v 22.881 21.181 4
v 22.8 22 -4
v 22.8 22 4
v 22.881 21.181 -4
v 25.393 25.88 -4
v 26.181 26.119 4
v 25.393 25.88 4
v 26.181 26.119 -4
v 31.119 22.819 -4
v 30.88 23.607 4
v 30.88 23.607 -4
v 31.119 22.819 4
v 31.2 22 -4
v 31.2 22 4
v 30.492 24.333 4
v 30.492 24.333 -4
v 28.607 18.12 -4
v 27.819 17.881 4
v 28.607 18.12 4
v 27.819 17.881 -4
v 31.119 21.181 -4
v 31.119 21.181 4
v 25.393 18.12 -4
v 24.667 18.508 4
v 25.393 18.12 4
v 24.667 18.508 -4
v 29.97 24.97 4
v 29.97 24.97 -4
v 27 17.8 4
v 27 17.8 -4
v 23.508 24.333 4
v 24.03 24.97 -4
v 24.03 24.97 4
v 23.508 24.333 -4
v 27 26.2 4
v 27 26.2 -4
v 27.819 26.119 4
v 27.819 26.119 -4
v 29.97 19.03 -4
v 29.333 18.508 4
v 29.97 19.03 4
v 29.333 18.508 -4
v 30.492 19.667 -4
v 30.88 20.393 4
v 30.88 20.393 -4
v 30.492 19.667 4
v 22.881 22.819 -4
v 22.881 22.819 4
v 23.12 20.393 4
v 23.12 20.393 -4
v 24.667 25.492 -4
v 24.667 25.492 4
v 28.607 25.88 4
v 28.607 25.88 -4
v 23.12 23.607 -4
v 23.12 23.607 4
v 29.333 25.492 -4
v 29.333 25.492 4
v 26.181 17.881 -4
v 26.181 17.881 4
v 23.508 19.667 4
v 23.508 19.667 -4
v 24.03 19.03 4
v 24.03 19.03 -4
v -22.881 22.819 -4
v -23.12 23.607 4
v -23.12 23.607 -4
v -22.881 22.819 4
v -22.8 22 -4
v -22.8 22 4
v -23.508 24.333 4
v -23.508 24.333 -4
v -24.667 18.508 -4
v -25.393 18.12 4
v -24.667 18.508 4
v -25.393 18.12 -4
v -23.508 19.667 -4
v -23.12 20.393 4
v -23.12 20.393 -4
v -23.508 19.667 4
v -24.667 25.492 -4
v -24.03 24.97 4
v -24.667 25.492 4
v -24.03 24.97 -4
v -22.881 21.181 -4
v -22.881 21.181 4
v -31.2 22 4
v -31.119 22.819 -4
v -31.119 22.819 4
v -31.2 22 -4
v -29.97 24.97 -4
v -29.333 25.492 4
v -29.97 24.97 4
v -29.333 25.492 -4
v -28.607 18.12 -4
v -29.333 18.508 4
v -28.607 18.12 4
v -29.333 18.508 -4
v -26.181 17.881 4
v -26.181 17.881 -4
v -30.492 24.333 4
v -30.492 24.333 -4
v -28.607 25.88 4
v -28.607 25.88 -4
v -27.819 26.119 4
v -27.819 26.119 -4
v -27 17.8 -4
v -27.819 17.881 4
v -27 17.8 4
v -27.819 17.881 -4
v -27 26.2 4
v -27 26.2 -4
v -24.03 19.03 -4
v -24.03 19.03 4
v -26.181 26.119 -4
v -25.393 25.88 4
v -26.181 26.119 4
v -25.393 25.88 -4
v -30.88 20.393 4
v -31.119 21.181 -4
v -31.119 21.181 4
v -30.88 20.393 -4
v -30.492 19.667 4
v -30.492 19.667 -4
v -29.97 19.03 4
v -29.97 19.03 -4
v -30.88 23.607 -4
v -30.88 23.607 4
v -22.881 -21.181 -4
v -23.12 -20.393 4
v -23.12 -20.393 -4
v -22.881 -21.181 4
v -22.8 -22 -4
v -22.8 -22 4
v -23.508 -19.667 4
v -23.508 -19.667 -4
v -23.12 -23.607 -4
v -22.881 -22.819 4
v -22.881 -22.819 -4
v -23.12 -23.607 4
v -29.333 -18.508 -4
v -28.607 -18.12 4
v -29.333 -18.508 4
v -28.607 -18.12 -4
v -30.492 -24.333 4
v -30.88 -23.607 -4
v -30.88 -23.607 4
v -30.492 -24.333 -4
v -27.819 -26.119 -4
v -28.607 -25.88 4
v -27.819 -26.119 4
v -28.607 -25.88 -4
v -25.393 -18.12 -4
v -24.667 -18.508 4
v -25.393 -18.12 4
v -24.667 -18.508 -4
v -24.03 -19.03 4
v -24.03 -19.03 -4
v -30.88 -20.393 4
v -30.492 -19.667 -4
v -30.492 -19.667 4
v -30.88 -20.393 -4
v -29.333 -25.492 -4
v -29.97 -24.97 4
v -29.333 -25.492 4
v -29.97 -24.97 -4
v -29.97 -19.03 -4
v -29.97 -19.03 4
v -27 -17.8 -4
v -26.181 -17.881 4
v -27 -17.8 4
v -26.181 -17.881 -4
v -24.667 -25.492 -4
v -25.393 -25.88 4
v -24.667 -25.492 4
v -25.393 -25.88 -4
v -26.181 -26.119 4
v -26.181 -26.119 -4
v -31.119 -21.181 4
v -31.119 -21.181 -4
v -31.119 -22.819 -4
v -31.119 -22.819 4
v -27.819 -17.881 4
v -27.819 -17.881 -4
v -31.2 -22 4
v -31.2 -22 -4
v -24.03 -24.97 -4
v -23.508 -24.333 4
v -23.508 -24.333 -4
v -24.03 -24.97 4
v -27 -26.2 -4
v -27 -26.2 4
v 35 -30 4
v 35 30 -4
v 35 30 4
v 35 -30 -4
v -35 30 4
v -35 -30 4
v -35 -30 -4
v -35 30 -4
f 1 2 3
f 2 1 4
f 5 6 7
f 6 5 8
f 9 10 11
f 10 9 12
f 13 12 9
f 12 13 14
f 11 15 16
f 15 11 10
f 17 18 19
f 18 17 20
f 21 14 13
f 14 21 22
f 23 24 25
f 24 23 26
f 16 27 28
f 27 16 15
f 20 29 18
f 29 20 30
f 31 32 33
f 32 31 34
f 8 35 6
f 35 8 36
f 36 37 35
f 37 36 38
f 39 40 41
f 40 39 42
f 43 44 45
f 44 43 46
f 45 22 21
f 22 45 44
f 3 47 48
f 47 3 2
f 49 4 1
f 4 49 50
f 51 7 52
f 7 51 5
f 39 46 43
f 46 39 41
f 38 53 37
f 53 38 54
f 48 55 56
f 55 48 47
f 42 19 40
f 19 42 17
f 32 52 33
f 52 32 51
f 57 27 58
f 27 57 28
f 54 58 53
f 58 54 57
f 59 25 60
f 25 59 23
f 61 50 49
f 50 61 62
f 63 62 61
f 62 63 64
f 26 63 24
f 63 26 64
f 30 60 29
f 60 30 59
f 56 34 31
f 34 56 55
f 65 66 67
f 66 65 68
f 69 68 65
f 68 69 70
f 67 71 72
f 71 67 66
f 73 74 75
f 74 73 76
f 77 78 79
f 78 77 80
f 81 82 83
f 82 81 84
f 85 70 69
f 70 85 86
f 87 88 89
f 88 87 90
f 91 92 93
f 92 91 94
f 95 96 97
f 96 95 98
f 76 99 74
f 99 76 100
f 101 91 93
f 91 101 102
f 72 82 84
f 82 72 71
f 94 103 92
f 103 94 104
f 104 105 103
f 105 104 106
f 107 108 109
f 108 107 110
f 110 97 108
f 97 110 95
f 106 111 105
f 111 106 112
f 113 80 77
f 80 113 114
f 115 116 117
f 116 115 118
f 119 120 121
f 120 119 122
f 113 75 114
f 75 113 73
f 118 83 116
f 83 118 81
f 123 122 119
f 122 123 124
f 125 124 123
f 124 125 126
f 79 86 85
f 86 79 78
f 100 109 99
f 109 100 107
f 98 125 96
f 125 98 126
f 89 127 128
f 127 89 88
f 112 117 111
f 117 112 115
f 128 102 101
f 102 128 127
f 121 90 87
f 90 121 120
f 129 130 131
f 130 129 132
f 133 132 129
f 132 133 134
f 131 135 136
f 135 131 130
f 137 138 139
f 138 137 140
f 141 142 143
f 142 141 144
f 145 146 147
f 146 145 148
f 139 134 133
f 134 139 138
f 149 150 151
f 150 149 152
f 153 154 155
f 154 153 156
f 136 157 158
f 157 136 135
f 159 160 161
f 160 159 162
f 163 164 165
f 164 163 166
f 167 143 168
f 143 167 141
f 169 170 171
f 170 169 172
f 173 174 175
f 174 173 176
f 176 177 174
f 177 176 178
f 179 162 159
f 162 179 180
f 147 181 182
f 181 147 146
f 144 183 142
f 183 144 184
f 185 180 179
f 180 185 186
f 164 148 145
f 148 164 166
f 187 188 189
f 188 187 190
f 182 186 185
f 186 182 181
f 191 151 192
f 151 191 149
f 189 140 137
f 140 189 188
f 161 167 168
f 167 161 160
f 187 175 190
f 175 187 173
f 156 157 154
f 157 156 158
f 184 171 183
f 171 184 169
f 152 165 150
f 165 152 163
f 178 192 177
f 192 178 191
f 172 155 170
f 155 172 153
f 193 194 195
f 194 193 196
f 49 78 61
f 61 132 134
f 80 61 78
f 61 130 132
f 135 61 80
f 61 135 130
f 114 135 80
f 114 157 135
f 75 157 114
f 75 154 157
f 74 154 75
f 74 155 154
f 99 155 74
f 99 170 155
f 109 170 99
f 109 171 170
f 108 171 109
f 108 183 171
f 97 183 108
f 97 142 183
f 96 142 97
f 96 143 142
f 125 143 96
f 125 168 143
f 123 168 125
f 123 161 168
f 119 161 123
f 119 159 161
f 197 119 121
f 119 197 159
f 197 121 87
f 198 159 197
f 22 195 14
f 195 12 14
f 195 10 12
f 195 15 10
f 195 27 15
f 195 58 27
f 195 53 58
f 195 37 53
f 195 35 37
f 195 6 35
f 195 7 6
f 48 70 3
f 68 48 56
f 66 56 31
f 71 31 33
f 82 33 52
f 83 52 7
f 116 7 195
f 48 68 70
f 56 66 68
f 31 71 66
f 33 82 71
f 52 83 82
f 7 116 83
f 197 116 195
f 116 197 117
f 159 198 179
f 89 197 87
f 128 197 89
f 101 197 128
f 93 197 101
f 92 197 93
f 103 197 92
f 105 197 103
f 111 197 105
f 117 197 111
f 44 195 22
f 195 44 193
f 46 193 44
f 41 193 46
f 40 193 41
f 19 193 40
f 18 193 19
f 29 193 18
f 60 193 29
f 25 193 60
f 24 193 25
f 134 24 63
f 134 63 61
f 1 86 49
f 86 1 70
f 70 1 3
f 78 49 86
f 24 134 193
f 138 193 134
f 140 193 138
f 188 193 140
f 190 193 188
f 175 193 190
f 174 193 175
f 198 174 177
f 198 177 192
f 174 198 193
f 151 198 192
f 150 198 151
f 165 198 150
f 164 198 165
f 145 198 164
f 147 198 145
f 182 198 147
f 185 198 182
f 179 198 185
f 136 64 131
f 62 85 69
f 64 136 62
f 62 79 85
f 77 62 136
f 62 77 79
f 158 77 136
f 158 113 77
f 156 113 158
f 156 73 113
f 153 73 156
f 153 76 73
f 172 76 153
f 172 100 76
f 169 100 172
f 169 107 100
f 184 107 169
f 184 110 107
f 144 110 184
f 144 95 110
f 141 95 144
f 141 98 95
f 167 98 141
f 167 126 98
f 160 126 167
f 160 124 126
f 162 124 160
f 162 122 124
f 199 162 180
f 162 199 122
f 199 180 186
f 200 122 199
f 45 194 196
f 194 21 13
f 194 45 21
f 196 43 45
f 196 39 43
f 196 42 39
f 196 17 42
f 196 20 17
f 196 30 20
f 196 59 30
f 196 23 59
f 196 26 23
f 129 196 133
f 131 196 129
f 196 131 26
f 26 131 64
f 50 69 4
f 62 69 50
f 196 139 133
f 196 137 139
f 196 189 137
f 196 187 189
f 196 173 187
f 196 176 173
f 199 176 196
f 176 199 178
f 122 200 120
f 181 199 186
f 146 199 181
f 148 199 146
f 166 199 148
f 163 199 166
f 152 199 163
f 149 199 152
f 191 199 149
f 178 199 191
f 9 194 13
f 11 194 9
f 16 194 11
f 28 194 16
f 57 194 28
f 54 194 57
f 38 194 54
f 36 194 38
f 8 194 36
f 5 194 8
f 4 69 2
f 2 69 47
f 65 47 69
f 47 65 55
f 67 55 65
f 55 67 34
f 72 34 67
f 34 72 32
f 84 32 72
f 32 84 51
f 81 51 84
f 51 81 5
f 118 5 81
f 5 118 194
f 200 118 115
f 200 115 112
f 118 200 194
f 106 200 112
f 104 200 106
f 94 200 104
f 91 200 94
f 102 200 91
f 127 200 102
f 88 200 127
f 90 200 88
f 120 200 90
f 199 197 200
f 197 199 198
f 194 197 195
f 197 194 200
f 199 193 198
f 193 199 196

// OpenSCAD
$fn = 32;

// ----------------------------------------------------------------------
// Corner plate 70 x 60 x 8
// 3 holes, centres taken from the edge offset
// ----------------------------------------------------------------------

// --- parameters (mm) ---
plate = [70, 60, 8];  // overall size (x, y, z)
holes = 3;            // number of holes the drawing asks for
hole_d = 8.4;         // hole diameter
edge = 8;             // hole centre offset from the plate edge

// --- derived feature positions (mm) ---
corner_x = plate[0] / 2 - edge;  // = 27   corner hole X
corner_y = plate[1] / 2 - edge;  // = 22   corner hole Y
feature_centers = [
  [corner_x, corner_y],
  [-corner_x, corner_y],
  [-corner_x, -corner_y]
];   // hole centres the loop below drills

// plate outline, every hole drilled through with the same cutters
difference() {
  cube(plate, center = true);
  for (centre = feature_centers)
    translate([centre[0], centre[1], 0])
      cylinder(d = hole_d, h = plate[2] + 2, center = true);
}
